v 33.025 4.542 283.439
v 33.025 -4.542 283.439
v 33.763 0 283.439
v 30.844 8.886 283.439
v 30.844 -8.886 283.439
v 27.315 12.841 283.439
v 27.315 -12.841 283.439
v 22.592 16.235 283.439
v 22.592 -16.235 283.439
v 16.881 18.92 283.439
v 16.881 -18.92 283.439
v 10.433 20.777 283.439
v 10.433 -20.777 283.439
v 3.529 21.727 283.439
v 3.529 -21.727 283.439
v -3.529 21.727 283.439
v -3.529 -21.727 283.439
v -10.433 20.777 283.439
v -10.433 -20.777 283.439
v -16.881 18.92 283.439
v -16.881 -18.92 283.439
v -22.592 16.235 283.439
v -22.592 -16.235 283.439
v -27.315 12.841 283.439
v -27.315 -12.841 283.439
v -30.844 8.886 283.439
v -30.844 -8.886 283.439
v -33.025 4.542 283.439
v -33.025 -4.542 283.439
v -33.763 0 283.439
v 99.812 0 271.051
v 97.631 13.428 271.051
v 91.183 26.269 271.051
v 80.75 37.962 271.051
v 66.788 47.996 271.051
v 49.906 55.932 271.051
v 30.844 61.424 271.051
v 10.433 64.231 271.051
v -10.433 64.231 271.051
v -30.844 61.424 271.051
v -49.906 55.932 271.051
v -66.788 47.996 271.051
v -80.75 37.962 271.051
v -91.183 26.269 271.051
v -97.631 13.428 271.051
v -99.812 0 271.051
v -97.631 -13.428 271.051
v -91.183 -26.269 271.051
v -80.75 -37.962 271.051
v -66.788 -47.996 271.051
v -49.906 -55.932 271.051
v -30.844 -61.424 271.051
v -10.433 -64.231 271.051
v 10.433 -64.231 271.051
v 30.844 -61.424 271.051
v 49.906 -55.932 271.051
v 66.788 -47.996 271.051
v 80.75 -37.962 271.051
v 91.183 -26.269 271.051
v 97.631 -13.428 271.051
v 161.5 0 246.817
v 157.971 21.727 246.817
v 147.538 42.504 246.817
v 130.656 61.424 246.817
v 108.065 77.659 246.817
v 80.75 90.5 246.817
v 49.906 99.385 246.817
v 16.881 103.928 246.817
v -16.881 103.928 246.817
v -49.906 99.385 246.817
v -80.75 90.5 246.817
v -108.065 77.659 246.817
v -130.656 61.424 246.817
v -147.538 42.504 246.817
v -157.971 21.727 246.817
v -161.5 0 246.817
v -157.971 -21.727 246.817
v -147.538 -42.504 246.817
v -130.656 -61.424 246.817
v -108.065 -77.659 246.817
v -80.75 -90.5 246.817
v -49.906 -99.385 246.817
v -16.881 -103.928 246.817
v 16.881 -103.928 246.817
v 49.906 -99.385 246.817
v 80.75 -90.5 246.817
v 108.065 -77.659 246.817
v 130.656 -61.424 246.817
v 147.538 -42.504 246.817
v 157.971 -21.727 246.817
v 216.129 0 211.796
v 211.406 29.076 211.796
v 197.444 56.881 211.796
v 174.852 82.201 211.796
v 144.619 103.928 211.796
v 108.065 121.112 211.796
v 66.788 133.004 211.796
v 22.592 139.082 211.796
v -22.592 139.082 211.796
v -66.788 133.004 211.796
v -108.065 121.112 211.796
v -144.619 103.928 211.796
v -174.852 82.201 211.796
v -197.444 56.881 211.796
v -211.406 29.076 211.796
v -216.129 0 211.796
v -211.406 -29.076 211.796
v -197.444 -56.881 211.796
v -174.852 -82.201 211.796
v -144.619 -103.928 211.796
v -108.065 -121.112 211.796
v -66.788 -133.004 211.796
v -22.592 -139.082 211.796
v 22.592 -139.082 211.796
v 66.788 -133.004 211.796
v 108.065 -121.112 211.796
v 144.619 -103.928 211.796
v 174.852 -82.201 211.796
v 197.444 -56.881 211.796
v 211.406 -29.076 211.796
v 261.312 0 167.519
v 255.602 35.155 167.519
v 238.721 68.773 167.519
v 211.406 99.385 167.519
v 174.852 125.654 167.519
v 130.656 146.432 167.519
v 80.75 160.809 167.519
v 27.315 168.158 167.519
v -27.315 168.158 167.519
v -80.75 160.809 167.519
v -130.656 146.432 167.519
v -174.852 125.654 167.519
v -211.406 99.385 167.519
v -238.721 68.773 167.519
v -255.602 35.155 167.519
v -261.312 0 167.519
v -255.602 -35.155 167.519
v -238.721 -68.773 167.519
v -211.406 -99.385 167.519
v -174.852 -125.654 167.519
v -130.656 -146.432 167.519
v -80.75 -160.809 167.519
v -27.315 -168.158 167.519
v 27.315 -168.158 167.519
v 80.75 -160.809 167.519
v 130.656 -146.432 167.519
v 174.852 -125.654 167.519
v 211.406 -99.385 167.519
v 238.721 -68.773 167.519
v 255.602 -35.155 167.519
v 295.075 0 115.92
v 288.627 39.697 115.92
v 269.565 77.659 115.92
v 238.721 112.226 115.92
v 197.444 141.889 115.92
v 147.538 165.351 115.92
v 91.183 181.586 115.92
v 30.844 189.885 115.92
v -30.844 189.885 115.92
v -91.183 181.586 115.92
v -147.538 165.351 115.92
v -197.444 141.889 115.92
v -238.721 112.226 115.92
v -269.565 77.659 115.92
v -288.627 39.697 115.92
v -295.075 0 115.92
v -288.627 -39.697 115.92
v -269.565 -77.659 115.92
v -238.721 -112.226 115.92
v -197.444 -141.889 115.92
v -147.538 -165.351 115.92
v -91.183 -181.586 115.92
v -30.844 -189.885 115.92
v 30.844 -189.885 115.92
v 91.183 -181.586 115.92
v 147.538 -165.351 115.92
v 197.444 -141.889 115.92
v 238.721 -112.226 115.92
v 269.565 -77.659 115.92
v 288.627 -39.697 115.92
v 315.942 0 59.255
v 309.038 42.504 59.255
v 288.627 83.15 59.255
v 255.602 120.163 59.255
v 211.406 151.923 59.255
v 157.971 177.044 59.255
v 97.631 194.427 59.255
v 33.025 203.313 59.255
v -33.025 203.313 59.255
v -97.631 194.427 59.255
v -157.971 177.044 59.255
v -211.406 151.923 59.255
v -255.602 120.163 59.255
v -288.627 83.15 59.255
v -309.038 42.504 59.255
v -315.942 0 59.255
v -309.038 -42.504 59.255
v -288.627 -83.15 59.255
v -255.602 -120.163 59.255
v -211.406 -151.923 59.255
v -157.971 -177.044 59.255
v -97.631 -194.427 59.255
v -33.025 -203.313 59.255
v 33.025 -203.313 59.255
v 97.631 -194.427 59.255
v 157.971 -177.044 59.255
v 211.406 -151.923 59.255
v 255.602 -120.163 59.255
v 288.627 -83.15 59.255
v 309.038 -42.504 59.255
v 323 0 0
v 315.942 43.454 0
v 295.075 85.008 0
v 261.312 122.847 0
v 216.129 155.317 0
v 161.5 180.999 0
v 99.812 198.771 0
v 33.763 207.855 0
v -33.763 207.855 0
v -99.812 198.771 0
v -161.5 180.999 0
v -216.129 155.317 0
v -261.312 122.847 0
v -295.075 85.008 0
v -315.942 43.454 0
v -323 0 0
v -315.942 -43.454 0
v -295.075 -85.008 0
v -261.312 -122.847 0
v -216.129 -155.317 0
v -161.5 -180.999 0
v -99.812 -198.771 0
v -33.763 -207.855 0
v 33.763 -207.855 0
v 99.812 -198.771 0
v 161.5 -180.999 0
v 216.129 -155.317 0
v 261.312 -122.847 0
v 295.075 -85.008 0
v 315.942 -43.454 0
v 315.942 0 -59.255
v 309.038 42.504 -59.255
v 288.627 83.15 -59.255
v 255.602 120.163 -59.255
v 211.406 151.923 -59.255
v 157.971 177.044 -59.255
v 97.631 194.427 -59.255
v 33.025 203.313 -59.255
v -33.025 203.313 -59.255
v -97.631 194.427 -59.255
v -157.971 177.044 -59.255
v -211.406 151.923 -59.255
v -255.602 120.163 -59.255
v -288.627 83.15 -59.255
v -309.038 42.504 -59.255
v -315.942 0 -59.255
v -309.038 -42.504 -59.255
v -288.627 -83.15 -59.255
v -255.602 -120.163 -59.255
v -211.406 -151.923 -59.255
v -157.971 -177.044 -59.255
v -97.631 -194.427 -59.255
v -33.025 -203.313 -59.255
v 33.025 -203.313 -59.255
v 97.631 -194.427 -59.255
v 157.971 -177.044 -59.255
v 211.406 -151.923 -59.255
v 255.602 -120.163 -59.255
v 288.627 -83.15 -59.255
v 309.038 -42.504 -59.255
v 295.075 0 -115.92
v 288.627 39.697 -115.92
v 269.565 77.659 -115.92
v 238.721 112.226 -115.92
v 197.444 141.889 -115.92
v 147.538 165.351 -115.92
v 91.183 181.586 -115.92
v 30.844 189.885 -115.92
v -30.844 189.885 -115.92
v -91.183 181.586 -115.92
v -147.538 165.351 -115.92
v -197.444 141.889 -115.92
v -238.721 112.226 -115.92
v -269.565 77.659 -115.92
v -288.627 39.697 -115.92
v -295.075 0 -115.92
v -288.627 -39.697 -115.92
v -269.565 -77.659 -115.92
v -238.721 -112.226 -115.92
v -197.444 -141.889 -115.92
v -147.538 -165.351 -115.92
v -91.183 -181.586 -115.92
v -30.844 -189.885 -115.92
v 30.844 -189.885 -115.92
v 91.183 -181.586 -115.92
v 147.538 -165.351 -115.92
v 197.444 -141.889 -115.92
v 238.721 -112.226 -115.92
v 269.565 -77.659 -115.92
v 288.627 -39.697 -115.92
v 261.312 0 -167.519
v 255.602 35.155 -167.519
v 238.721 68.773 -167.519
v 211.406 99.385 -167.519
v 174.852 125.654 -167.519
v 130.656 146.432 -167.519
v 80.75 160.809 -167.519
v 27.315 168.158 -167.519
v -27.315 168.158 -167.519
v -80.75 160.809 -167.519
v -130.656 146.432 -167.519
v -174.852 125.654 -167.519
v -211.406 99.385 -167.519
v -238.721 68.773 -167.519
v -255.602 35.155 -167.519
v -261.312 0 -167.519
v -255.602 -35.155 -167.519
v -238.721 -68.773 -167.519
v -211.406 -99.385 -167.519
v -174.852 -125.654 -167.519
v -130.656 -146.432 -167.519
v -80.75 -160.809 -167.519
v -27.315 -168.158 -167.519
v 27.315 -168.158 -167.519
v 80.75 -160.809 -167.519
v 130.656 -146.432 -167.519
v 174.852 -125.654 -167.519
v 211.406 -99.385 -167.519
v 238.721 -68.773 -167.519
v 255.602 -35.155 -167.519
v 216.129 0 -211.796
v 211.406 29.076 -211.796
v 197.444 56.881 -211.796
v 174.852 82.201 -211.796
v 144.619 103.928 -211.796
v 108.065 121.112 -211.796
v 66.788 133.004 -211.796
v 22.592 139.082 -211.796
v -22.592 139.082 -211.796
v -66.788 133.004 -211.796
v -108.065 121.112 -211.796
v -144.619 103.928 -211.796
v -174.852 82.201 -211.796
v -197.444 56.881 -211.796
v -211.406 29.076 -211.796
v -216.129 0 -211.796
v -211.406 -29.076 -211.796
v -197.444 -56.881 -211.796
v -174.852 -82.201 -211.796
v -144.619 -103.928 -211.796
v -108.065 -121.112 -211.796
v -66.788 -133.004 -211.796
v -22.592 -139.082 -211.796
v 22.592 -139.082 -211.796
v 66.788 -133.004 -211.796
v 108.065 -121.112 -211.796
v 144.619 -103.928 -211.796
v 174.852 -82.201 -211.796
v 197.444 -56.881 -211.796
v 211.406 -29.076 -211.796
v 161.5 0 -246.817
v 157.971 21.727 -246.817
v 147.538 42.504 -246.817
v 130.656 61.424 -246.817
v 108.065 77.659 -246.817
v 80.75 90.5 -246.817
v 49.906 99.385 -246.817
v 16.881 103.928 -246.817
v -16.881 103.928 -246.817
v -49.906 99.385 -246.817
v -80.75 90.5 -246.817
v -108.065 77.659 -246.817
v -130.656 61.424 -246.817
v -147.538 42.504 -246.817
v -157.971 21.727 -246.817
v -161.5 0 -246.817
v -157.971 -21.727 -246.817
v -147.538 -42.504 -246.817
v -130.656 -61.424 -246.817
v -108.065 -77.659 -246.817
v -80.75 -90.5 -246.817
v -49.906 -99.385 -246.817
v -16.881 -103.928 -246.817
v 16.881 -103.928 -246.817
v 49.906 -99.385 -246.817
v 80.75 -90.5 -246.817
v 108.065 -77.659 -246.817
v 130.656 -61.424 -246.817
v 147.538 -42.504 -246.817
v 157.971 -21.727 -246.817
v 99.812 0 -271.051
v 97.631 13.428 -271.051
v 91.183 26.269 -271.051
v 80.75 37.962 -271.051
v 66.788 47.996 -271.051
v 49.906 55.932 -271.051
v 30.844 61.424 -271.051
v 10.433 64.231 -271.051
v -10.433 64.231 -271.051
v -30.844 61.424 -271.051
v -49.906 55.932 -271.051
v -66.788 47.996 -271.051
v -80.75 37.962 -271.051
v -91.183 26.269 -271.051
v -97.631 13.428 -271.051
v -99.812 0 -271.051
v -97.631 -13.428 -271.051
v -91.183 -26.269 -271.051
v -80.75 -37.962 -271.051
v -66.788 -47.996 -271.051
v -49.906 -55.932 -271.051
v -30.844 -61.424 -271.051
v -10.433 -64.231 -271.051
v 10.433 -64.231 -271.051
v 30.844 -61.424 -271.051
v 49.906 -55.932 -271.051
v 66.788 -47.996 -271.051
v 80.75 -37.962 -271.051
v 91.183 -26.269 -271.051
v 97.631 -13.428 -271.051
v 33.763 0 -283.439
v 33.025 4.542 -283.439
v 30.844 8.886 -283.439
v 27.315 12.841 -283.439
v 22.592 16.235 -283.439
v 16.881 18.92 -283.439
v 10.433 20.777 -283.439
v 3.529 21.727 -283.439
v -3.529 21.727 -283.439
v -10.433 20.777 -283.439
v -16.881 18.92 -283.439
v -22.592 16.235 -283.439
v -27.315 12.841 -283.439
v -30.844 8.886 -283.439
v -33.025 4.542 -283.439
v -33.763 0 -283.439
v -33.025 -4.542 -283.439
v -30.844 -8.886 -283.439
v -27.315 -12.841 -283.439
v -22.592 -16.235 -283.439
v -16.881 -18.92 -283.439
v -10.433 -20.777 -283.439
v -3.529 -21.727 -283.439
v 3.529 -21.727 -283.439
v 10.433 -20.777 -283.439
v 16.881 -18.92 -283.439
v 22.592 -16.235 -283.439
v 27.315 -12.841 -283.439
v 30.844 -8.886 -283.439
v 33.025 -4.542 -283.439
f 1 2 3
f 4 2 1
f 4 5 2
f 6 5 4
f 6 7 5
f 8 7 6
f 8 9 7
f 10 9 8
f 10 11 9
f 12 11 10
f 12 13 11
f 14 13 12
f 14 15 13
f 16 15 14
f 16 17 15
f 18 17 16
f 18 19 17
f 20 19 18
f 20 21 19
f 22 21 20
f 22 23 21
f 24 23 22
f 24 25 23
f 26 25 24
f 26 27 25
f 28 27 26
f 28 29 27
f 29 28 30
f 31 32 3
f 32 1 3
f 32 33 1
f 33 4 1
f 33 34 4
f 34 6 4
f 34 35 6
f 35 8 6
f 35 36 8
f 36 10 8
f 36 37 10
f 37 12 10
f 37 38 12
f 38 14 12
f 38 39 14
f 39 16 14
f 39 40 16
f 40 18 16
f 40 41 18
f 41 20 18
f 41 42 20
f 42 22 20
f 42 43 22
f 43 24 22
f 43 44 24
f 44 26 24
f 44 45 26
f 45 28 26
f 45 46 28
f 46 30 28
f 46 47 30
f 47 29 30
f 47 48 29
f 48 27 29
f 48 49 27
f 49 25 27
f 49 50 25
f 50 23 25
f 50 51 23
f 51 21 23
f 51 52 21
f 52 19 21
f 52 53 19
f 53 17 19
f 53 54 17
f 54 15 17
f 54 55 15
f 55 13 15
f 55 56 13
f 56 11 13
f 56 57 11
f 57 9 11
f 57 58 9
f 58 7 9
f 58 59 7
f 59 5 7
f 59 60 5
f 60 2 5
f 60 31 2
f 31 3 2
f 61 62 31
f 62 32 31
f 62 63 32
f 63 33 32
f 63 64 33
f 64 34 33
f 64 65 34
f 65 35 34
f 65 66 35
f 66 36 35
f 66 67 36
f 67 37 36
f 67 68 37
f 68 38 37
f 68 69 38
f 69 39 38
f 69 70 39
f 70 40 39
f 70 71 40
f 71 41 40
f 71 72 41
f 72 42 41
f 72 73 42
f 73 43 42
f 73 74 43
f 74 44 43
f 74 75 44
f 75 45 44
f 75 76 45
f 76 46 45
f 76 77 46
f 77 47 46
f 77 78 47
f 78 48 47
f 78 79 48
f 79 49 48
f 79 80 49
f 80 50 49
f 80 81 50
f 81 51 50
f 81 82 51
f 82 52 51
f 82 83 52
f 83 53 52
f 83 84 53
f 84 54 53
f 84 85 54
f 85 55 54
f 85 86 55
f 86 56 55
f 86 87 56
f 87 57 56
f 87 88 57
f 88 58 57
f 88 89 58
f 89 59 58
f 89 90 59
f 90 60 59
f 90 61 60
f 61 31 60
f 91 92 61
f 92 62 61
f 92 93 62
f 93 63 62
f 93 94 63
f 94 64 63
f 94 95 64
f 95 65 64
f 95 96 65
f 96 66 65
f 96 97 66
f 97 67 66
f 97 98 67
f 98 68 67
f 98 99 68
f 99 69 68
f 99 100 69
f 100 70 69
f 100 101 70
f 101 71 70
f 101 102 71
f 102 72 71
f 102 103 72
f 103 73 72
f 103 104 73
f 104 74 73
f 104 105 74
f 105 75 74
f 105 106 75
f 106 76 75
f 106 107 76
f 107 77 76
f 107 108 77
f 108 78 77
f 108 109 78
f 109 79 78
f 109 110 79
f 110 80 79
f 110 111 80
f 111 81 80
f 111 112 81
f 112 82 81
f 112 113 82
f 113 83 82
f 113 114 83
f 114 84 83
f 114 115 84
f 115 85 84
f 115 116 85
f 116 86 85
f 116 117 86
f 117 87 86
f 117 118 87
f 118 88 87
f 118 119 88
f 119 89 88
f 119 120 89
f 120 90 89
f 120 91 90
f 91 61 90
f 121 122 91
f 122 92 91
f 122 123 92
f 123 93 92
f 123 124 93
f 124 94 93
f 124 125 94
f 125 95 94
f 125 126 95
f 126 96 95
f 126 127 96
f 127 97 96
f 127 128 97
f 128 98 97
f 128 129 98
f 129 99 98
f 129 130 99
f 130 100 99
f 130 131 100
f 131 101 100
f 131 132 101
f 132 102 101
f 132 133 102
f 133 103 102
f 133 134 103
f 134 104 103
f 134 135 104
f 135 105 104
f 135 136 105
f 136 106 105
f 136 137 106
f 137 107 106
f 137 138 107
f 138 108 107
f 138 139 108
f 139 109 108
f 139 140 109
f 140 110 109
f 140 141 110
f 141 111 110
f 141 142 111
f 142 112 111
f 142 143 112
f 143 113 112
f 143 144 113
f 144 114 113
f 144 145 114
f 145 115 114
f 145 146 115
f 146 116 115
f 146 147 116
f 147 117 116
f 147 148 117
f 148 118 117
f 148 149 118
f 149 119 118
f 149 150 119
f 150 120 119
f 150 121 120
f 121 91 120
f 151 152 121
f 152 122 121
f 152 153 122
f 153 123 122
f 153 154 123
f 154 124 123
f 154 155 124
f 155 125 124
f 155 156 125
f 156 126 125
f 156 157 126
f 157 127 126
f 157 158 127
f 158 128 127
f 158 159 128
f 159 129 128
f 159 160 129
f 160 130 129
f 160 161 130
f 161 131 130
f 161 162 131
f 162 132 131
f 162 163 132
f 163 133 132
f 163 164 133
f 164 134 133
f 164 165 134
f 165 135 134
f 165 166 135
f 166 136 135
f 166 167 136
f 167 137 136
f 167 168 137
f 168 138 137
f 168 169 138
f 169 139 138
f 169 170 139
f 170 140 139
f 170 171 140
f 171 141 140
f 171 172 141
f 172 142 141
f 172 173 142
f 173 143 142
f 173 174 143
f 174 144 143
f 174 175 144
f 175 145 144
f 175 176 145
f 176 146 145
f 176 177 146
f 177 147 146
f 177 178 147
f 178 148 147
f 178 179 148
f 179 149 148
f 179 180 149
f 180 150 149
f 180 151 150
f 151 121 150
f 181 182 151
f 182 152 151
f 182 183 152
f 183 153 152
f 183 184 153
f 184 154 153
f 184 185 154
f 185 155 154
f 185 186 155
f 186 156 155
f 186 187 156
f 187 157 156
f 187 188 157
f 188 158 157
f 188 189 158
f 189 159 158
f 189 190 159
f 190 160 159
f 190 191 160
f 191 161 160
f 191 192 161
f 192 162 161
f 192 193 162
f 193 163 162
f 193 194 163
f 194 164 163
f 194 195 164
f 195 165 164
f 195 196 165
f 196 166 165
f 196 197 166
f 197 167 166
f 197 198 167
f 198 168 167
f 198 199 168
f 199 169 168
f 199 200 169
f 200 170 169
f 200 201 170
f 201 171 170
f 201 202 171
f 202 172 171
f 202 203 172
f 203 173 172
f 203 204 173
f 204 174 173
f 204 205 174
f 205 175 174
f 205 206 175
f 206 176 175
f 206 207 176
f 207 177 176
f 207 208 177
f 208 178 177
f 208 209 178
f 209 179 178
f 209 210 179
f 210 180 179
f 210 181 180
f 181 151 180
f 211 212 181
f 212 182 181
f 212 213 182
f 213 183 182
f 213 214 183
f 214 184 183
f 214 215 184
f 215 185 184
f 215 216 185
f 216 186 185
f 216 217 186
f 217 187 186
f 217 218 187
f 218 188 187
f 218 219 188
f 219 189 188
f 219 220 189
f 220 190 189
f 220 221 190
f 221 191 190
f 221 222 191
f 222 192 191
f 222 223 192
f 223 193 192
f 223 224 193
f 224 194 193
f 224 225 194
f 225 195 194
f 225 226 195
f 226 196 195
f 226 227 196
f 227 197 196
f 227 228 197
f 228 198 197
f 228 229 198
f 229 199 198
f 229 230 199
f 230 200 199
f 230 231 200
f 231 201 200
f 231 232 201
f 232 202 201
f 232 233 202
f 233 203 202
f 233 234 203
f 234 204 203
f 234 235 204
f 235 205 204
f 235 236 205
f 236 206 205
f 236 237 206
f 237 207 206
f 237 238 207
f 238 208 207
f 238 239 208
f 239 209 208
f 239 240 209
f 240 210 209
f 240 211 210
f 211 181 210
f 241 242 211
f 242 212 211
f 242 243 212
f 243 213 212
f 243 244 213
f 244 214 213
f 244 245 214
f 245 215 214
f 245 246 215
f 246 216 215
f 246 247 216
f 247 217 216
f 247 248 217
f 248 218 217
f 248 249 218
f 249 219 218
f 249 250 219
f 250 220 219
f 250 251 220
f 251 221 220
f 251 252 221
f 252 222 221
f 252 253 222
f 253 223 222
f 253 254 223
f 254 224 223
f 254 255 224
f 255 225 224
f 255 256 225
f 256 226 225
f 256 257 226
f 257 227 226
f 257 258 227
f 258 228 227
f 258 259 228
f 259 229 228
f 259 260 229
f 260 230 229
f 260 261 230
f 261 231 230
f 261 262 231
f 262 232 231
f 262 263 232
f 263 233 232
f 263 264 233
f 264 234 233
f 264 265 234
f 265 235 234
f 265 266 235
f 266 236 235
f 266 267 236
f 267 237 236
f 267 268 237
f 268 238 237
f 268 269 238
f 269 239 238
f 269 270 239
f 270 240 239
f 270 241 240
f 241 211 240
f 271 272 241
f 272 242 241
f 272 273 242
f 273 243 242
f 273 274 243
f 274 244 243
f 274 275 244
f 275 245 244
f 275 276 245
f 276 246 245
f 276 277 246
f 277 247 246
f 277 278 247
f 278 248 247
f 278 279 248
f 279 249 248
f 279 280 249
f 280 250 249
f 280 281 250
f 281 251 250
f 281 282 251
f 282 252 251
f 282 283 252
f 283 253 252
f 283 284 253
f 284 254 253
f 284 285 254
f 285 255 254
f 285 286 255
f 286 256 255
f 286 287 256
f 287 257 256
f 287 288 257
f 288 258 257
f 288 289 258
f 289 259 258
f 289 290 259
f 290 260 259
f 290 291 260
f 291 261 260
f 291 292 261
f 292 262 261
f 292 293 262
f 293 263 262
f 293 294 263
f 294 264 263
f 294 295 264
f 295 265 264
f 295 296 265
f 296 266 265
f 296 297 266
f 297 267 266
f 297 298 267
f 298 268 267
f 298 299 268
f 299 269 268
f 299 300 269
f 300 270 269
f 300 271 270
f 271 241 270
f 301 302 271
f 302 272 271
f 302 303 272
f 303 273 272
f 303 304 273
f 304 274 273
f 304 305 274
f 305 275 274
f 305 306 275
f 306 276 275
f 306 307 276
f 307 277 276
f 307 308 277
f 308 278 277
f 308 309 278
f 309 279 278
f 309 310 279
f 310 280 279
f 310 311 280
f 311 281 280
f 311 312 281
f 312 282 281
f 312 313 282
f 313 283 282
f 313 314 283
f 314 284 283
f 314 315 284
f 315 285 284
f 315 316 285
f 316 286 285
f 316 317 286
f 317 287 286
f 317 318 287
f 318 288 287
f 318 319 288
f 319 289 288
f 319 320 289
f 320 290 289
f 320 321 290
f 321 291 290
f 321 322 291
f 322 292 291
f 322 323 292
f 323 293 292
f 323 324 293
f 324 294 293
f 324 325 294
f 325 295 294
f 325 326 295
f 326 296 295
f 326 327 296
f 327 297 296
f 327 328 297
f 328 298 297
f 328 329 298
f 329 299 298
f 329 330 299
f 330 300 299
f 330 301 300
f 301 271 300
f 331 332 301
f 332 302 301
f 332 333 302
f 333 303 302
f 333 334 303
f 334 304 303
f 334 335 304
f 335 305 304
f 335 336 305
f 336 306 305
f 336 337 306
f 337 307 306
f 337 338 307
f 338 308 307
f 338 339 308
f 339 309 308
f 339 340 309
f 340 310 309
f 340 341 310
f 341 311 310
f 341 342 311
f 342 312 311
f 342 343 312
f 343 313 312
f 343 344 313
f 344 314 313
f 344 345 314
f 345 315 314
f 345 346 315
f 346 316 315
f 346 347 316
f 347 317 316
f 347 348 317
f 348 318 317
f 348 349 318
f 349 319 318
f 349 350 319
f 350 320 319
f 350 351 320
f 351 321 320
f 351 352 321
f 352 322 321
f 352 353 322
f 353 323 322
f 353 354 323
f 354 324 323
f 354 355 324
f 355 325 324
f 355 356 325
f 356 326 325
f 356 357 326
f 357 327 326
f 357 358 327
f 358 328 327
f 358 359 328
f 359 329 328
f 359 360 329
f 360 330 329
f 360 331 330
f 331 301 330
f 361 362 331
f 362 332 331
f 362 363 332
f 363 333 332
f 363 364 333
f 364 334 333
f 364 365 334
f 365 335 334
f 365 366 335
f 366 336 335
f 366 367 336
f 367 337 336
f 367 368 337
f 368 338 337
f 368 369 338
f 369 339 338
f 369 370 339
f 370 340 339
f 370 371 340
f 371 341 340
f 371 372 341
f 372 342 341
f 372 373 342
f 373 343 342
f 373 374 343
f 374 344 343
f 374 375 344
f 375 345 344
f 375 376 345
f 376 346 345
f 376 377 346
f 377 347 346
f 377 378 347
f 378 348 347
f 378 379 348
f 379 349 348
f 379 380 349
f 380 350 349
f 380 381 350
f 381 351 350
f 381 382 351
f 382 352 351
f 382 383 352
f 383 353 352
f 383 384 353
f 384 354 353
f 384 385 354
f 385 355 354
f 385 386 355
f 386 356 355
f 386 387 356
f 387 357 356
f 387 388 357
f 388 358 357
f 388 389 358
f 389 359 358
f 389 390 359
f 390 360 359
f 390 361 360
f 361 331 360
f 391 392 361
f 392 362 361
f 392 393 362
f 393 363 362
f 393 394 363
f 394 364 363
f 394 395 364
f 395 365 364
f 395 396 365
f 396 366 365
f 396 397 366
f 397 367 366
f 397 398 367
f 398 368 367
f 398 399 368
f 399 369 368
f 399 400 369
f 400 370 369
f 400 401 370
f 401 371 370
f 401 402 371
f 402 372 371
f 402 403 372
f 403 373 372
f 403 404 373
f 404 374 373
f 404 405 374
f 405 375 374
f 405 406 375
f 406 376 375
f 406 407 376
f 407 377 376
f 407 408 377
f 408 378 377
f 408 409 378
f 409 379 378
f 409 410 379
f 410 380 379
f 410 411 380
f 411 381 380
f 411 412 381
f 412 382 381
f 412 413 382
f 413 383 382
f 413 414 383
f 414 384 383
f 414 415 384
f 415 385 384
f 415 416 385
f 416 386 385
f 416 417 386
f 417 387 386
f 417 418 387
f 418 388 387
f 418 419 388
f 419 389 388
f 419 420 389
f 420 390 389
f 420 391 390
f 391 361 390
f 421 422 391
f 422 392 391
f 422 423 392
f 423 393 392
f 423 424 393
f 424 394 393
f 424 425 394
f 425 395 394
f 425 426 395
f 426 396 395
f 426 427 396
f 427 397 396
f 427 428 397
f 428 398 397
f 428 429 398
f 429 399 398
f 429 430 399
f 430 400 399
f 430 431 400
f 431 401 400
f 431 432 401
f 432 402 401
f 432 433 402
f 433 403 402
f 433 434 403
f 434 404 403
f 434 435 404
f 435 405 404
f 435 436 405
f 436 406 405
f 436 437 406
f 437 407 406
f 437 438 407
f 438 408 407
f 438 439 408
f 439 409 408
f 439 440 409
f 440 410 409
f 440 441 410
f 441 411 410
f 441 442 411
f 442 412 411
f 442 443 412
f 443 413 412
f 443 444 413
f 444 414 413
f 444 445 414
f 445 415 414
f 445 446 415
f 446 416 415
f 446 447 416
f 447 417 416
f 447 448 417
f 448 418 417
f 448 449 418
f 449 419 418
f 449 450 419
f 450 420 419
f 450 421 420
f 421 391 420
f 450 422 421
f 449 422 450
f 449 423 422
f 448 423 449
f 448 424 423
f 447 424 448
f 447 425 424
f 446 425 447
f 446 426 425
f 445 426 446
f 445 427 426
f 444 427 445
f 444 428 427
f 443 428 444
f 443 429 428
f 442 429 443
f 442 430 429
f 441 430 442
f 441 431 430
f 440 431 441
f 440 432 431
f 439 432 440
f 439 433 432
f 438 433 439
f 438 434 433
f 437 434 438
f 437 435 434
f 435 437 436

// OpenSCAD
// Generated by SolidPython 1.0.1 on 2020-07-29 00:46:53


scale(v = [17, 11, 15]) {
	sphere(r = 19);
}
/***********************************************
*********      SolidPython code:      **********
************************************************
 
# import packages: SolidPython
from solid import *
from solid.utils import *
from itertools import chain, combinations, permutations


class Resize:

    def __init__(self, scad_file):
        self.scad_file = scad_file
        #self.scad_file = import_scad(scad_file)
        # cone/cylinder param:
        self.r1 = 0
        self.r2 = 0
        self.h = 0
        # rectangular prism param:
        self.w = 0
        self.l = 0
        # ellipse param:
        self.r = 0

    # import OpenScad code (file name corresponds to shape)


    # classify shape + parameters
    def assign(self, param1, param2, param3):
        if self.scad_file == 'cone.scad':
            self.r1 = param1
            self.r2 = param2
            self.h = param3
        elif self.scad_file == 'cylinder.scad':
            self.r1 = param1
            self.r2 = param2
            self.h = param3
        elif self.scad_file == 'rectangularPrism.scad':
            self.h = param1
            self.l = param2
            self.w = param3
        else:
            self.r = param1
            self.h = param2

    # resize parameters
    def iterate(self):
        x = range(3, 20, 2)
        i = 1
        if self.scad_file == 'cone.scad':
            tempList = list(permutations(x, 2))
            for temp in tempList:
                param1 = temp[0]
                param2 = temp[1]
                filepath = 'produced_scad_files/' + 'cone' + str(param1) + '_' + str(param2) + '_' + '.scad'
                scad_render_to_file(cylinder(h=param1, r1=param2, r2=0), filepath)

        elif self.scad_file == 'cylinder.scad':
            tempList = list(permutations(x, 3))
            for temp in tempList:
                param1 = temp[0]
                param2 = temp[1]
                filepath = 'produced_scad_files/' + 'cylinder' + str(param1) + '_' + str(param2) + '_' + '.scad'
                scad_render_to_file(cylinder(h=param1, r1=param2, r2=param2), filepath)

        elif self.scad_file == 'rectangularPrism.scad':
            tempList = list(permutations(x, 3))
            for temp in tempList:
                param1 = temp[0]
                param2 = temp[1]
                param3 = temp[2]
                filepath = 'produced_scad_files/' + 'rectangularPrism' + str(param1) + '_' + str(param2) + '_' + str(
                    param3) + '.scad'
                scad_render_to_file(cube(size=(param1, param2, param3)), filepath)

        elif self.scad_file == 'ellipse.scad':
            tempList = list(permutations(x, 4))
            for temp in tempList:
                param1 = temp[0]
                param2 = temp[1]
                param3 = temp[2]
                param4 = temp[3]
                filepath = 'produced_scad_files/' + 'ellipse' + str(param1) + '_' + str(param2) + '_' + str(param3) + '_' + str(param4) + '.scad'
                scad_render_to_file(scale([param1, param2, param3])(sphere(r=param4)), filepath)

    def render_to_scadfile(self):
        scad_render_to_file(scad, 'example.scad') 
 
************************************************/
